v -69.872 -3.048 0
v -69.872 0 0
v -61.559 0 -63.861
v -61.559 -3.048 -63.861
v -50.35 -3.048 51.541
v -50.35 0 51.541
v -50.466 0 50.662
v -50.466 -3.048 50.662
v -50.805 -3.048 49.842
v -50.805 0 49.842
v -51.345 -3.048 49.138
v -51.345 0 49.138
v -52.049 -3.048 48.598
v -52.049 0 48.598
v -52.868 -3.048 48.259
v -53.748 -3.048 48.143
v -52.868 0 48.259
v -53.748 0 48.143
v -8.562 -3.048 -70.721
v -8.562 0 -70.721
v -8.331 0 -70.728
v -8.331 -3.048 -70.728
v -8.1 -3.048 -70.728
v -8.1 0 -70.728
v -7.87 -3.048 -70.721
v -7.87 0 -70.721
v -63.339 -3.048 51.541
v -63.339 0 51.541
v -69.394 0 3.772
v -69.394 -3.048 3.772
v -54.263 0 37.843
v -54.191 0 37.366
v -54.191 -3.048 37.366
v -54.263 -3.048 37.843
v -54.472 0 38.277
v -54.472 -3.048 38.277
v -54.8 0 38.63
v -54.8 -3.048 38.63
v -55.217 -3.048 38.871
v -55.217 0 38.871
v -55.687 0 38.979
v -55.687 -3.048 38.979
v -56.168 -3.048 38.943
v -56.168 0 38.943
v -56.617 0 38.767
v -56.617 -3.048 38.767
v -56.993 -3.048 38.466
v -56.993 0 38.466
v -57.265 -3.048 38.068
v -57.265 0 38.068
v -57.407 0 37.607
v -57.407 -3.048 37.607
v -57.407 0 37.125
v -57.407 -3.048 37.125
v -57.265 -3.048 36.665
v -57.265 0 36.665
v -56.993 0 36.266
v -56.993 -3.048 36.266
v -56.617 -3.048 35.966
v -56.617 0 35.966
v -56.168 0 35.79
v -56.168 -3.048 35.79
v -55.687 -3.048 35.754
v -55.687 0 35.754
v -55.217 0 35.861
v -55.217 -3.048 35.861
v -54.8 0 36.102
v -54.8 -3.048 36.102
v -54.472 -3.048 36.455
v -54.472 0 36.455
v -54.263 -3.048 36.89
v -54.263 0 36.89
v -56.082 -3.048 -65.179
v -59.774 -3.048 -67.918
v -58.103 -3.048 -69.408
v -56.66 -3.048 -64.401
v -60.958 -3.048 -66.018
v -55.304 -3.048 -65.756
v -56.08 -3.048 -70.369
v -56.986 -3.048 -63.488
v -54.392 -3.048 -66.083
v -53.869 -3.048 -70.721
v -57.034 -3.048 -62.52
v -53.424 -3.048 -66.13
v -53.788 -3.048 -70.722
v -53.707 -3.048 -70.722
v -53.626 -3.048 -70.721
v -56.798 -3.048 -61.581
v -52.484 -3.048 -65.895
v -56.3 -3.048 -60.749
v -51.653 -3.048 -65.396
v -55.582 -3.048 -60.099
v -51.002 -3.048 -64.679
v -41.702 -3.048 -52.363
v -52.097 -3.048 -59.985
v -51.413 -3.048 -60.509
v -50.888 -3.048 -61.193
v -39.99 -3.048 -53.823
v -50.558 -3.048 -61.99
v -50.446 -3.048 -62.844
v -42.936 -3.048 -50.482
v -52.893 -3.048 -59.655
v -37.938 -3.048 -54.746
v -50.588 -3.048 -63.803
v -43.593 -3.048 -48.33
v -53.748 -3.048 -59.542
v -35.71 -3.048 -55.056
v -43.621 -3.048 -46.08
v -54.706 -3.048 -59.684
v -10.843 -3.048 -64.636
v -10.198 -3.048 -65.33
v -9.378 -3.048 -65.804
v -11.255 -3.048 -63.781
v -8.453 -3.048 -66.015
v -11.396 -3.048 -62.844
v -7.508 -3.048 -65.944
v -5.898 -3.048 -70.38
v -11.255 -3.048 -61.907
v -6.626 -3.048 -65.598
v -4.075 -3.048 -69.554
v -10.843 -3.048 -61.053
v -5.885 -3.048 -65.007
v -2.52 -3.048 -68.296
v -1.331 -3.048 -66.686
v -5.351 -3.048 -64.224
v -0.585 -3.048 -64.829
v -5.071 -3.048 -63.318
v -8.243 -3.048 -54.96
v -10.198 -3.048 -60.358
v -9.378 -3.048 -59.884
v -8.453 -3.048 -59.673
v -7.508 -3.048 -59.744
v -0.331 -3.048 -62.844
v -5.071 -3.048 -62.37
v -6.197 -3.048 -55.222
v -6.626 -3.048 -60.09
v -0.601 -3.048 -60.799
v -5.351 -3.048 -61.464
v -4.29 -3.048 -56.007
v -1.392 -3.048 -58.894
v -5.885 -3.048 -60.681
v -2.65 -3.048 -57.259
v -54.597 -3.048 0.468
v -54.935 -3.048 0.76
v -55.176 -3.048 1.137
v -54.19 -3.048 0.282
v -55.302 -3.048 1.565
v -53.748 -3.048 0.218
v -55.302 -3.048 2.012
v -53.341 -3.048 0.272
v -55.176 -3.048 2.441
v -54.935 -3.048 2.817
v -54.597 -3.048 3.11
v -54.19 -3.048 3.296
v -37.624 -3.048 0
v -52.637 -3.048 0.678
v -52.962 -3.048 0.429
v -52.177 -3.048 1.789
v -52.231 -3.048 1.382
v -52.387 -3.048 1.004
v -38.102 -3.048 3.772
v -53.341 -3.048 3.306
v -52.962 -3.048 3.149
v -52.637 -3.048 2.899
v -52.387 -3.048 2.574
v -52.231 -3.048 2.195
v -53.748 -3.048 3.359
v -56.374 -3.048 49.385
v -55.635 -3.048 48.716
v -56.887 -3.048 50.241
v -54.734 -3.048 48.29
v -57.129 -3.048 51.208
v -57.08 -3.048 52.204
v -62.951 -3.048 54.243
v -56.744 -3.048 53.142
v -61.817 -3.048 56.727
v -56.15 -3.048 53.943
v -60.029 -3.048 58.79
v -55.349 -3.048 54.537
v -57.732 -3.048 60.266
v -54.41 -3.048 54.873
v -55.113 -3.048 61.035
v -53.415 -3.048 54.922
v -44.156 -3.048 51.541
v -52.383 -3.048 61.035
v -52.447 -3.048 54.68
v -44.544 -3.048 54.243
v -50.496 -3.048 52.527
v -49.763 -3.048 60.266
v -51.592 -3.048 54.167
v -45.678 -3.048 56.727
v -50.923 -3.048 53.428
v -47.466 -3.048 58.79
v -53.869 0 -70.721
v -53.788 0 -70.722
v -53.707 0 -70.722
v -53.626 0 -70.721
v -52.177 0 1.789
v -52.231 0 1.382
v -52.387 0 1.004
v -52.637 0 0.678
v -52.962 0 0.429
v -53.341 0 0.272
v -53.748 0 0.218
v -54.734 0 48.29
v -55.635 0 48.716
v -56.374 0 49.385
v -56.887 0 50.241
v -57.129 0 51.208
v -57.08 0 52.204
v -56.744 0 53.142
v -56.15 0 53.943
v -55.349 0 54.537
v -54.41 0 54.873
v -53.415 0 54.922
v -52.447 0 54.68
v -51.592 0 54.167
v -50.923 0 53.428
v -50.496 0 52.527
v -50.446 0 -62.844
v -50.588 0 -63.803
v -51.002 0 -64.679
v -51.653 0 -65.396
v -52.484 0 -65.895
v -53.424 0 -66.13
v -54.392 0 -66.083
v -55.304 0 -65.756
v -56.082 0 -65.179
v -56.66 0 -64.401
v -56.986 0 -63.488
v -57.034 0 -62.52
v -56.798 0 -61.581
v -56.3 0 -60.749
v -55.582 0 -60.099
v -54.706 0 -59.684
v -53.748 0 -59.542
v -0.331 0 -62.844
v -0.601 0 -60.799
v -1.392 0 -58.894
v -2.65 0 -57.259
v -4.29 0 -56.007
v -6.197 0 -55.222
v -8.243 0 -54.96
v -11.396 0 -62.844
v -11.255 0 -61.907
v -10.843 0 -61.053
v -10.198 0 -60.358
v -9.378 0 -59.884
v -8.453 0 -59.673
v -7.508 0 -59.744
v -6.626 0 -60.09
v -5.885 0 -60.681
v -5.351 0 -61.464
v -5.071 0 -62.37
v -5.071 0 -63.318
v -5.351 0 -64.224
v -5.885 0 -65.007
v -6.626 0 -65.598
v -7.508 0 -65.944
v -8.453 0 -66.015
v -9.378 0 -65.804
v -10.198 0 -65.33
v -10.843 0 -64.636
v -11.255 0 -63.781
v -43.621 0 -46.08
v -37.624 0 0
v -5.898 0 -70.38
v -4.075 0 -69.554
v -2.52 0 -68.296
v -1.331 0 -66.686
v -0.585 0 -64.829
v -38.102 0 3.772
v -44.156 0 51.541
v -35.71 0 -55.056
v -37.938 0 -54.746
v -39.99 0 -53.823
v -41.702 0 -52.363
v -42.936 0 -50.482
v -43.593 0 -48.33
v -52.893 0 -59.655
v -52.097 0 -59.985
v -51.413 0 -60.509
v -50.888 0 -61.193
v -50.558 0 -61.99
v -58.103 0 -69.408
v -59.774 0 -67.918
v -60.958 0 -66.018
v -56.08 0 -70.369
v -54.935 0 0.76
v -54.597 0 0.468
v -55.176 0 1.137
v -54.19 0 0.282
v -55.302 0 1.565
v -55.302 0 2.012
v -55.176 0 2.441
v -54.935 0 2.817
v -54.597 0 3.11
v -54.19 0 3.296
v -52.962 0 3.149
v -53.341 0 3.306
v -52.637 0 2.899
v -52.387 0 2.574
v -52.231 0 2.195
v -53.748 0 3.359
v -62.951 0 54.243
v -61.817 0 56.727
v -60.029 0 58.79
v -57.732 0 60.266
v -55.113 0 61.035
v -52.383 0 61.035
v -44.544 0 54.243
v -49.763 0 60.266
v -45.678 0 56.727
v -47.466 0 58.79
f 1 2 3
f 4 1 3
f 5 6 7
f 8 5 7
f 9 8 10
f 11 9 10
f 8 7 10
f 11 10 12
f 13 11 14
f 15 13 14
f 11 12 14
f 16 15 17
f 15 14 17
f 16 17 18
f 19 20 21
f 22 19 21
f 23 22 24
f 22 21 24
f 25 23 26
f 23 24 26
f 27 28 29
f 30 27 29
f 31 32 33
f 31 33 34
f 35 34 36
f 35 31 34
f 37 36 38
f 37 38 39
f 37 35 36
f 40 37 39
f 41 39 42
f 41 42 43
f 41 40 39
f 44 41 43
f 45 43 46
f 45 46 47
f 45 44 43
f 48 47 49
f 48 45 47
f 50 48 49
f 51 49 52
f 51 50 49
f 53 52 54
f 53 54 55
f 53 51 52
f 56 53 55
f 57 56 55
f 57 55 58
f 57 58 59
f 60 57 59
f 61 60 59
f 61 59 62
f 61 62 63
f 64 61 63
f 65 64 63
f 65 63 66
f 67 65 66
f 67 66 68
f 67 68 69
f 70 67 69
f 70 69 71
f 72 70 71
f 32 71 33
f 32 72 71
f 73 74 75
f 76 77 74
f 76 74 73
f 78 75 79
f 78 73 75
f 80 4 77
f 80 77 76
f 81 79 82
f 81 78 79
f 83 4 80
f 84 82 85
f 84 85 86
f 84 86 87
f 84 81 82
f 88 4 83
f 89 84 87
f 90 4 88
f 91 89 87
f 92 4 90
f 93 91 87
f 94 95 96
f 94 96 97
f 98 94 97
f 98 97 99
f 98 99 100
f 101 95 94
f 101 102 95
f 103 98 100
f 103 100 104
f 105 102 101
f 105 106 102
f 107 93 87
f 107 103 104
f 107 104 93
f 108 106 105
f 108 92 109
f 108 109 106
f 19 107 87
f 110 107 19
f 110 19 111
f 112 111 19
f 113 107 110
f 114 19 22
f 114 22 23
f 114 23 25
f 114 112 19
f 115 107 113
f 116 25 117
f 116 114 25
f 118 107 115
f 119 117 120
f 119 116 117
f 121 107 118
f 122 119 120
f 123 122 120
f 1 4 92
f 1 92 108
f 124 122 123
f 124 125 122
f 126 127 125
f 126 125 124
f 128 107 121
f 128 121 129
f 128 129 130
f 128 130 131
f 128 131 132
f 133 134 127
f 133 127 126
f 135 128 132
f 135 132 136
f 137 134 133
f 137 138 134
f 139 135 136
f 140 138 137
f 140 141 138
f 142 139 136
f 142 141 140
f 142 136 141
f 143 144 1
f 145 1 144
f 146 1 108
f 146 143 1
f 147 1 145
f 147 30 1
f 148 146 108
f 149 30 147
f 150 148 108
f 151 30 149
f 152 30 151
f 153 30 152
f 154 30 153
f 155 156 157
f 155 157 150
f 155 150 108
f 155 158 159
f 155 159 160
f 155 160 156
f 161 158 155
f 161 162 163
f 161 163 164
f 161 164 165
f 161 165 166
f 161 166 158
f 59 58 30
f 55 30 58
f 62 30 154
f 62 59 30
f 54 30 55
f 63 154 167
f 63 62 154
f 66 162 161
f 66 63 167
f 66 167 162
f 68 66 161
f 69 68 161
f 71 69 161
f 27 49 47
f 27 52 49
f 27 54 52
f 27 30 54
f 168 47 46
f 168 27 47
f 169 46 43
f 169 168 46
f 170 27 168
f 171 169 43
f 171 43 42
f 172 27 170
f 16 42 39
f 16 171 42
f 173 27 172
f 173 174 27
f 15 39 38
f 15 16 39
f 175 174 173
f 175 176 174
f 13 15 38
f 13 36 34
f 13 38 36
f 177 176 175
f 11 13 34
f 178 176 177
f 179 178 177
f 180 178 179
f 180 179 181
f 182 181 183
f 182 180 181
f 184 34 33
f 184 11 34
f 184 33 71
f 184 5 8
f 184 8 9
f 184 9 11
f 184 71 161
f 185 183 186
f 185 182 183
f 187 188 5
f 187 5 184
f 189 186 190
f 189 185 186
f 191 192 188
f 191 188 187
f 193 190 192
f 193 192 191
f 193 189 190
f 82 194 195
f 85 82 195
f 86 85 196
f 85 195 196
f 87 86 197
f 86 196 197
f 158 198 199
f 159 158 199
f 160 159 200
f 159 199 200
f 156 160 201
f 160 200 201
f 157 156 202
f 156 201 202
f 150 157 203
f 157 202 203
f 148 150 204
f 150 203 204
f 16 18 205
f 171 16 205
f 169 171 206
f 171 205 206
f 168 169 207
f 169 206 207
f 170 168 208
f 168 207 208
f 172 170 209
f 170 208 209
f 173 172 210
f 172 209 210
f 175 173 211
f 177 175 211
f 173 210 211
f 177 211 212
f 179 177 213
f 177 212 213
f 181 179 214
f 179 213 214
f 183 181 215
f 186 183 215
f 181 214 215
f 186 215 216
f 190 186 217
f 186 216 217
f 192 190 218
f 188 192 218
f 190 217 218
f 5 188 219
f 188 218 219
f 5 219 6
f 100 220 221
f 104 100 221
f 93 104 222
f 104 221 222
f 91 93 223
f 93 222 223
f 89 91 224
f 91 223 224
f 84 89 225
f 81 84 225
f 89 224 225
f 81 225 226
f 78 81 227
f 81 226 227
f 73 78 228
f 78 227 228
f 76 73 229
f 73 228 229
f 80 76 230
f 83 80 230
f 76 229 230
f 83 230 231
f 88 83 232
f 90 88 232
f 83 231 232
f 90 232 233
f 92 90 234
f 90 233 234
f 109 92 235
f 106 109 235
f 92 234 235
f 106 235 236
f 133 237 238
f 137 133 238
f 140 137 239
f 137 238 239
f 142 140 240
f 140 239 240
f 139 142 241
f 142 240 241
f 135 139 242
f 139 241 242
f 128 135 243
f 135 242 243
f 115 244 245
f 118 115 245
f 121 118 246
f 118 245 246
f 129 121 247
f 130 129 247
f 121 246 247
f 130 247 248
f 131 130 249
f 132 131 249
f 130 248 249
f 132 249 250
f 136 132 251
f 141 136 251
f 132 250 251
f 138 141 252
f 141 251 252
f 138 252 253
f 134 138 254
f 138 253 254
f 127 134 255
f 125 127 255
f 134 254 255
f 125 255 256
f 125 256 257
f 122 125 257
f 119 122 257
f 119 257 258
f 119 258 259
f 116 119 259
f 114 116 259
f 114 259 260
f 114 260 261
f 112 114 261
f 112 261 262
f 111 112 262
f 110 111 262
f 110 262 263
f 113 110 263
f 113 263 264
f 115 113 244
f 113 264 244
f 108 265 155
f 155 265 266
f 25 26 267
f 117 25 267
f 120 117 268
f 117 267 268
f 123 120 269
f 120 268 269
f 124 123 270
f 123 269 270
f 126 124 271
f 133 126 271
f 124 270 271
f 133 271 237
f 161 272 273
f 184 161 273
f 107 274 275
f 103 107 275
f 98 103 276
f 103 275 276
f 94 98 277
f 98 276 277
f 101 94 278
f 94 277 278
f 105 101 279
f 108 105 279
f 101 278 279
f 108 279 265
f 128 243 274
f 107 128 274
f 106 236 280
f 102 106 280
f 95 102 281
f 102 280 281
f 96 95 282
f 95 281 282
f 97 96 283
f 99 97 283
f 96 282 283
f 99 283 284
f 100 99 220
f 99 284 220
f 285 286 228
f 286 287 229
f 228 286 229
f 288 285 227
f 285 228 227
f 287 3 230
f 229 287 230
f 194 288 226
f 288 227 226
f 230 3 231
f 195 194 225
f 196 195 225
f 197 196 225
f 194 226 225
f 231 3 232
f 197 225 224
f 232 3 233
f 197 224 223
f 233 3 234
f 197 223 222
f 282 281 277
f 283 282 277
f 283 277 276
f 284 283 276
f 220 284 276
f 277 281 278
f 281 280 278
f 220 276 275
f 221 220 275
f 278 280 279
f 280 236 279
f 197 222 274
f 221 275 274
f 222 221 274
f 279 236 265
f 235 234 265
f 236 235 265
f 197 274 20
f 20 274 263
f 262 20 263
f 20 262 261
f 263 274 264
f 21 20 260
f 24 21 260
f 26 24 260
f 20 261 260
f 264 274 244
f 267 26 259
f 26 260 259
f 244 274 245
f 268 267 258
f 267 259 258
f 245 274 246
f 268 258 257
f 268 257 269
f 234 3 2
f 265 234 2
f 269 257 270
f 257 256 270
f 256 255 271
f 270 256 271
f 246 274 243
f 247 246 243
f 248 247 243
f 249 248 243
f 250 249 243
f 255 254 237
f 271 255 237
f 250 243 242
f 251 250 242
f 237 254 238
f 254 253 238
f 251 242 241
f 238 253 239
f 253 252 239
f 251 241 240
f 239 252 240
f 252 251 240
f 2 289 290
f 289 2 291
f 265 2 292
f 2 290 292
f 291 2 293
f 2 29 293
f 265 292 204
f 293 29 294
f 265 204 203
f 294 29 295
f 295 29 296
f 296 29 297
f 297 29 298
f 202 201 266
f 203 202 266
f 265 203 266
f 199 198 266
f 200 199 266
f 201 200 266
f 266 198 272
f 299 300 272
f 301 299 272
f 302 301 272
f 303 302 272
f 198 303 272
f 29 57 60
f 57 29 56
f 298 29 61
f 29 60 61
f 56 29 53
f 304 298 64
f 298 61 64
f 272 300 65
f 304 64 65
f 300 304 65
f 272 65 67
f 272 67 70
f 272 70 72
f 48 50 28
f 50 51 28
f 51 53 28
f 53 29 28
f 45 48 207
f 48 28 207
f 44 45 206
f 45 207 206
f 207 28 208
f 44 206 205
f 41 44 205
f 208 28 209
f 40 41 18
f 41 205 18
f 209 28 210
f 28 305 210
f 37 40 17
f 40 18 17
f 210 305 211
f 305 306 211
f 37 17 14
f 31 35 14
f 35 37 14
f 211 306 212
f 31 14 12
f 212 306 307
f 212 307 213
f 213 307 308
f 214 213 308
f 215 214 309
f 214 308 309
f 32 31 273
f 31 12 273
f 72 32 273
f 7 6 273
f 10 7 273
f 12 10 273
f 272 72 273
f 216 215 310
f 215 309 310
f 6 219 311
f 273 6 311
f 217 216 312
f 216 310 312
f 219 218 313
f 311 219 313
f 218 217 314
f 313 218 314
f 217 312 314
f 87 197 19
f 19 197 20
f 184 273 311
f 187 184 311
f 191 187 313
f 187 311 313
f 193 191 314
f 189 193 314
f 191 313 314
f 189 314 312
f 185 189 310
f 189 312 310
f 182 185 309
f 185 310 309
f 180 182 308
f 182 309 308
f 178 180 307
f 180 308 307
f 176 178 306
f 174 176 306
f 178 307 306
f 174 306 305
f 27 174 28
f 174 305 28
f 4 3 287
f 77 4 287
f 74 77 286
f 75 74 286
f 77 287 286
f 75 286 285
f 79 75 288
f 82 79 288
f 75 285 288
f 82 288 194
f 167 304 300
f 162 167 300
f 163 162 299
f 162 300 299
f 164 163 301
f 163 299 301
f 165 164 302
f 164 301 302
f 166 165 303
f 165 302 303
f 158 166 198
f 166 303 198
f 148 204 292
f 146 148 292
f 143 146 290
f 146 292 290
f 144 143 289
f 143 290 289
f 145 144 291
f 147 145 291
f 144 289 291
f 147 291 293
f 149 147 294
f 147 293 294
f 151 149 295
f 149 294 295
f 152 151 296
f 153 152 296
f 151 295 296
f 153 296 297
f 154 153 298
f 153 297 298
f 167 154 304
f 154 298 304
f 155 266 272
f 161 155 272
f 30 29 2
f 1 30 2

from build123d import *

# Parameters (mm, degrees)
F0_R     = 1.6169626647
F1_DEPTH = 3.048


with BuildPart() as f1:
    # F0 (on Front) → F1 (new body)
    with BuildSketch(Plane.XZ):
        with BuildLine():
            ThreePointArc((-63.3394401935, 51.5408627689), (-60.5300601386, 44.7584193386), (-53.7476167083, 41.9490392837))
            ThreePointArc((-53.7476167083, 41.9490392837), (-46.9651732779, 44.7584193386), (-44.1557932231, 51.5408627689))
            ThreePointArc((-44.1557932231, 51.5408627689), (-53.7476167083, 61.1326862541), (-63.3394401935, 51.5408627689))
        make_face()
        with BuildLine():
            ThreePointArc((-50.3500356436, 51.5408627689), (-51.3451640978, 49.1384101584), (-53.7476167083, 48.1432817042))
            ThreePointArc((-53.7476167083, 48.1432817042), (-56.1500693187, 53.9433153794), (-50.3500356436, 51.5408627689))
        make_face(mode=Mode.SUBTRACT)
        with BuildLine():
            ThreePointArc((-44.1557932231, 51.5408627689), (-46.9651732779, 44.7584193386), (-53.7476167083, 41.9490392837))
            Line((-53.7476167083, 41.9490392837), (-53.7476167083, 17.560091))
            ThreePointArc((-53.7476167083, 17.560091), (-43.320354495, 13.6211561996), (-38.1016313362, 3.7718956578))
            Line((-38.1016313362, 3.7718956578), (-44.1557932231, 51.5408627689))
        make_face()
        with BuildLine():
            Line((-53.7476167083, 17.560091), (-53.7476167083, 41.9490392837))
            ThreePointArc((-53.7476167083, 41.9490392837), (-60.5300601386, 44.7584193386), (-63.3394401935, 51.5408627689))
            Line((-63.3394401935, 51.5408627689), (-69.3936021245, 3.7718953097))
            ThreePointArc((-69.3936021245, 3.7718953097), (-64.1748790532, 13.6211560835), (-53.7476167083, 17.560091))
        make_face()
        with Locations((-55.8080822229, 37.366181612)):
            Circle(F0_R, mode=Mode.SUBTRACT)
        with BuildLine():
            ThreePointArc((-38.1016313362, 3.7718956578), (-43.320354495, 13.6211561996), (-53.7476167083, 17.560091))
            Line((-53.7476167083, 17.560091), (-53.7476167083, 3.3594787524))
            ThreePointArc((-53.7476167083, 3.3594787524), (-52.6370840671, 2.8994810709), (-52.1770863857, 1.7889484297))
            ThreePointArc((-52.1770863857, 1.7889484297), (-52.6370840671, 0.6784157886), (-53.7476167083, 0.2184181071))
            Line((-53.7476167083, 0.2184181071), (-53.7476167083, -13.9821941405))
            ThreePointArc((-53.7476167083, -13.9821941405), (-42.5957348498, -9.3629334288), (-37.976474138, 1.7889484297))
            ThreePointArc((-37.976474138, 1.7889484297), (-38.0077945376, 2.78239496), (-38.1016313362, 3.7718956578))
        make_face()
        with BuildLine():
            Line((-53.7476167083, 3.3594787524), (-53.7476167083, 17.560091))
            ThreePointArc((-53.7476167083, 17.560091), (-64.1748790532, 13.6211560835), (-69.3936021245, 3.7718953097))
            ThreePointArc((-69.3936021245, 3.7718953097), (-65.5798243621, -8.6383139152), (-53.7476167083, -13.9821941405))
            Line((-53.7476167083, -13.9821941405), (-53.7476167083, 0.2184181071))
            ThreePointArc((-53.7476167083, 0.2184181071), (-55.3181470309, 1.7889484297), (-53.7476167083, 3.3594787524))
        make_face()
        with BuildLine():
            Line((-37.6235873609, 0), (-38.1016313362, 3.7718956578))
            ThreePointArc((-38.1016313362, 3.7718956578), (-38.0077945376, 2.78239496), (-37.976474138, 1.7889484297))
            ThreePointArc((-37.976474138, 1.7889484297), (-42.5957348498, -9.3629334288), (-53.7476167083, -13.9821941405))
            Line((-53.7476167083, -13.9821941405), (-53.7476167083, -54.9663756517))
            ThreePointArc((-53.7476167083, -54.9663756517), (-48.1772102832, -57.2737135409), (-45.869872394, -62.844119966))
            Line((-45.869872394, -62.844119966), (-16.1001367542, -62.844119966))
            ThreePointArc((-16.1001367542, -62.844119966), (-13.8006404187, -57.278812686), (-8.2434529492, -54.9597620295))
            Line((-8.2434529492, -54.9597620295), (-35.7097443, -55.0563386246))
            ThreePointArc((-35.7097443, -55.0563386246), (-41.7018969318, -52.3629945232), (-43.6213969554, -46.0800401807))
            Line((-43.6213969554, -46.0800401807), (-37.6235873609, 0))
        make_face()
        with BuildLine():
            ThreePointArc((-53.7476167083, -13.9821941405), (-65.5798243621, -8.6383139152), (-69.3936021245, 3.7718953097))
            Line((-69.3936021245, 3.7718953097), (-69.8716460556, 0))
            Line((-69.8716460556, 0), (-61.5594655419, -63.8609155613))
            ThreePointArc((-61.5594655419, -63.8609155613), (-59.6666078048, -57.6456201939), (-53.7476167083, -54.9663756517))
            Line((-53.7476167083, -54.9663756517), (-53.7476167083, -13.9821941405))
        make_face()
        with BuildLine():
            Line((-53.7476167083, -59.5422655519), (-53.7476167083, -54.9663756517))
            ThreePointArc((-53.7476167083, -54.9663756517), (-59.6666078048, -57.6456201939), (-61.5594655419, -63.8609155613))
            ThreePointArc((-61.5594655419, -63.8609155613), (-58.991522279, -68.7229217017), (-53.868886638, -70.7209308109))
            Line((-53.868886638, -70.7209308109), (-53.6263467786, -70.7209308109))
            ThreePointArc((-53.6263467786, -70.7209308109), (-48.1344986363, -68.371484708), (-45.869872394, -62.844119966))
            Line((-45.869872394, -62.844119966), (-50.4457622942, -62.844119966))
            ThreePointArc((-50.4457622942, -62.844119966), (-56.082380355, -65.1788836127), (-53.7476167083, -59.5422655519))
        make_face()
        with BuildLine():
            Line((-16.1001367542, -62.844119966), (-45.869872394, -62.844119966))
            ThreePointArc((-45.869872394, -62.844119966), (-48.1344986363, -68.371484708), (-53.6263467786, -70.7209308109))
            Line((-53.6263467786, -70.7209308109), (-8.5617351981, -70.7209308109))
            ThreePointArc((-8.5617351981, -70.7209308109), (-13.9118653342, -68.2955337071), (-16.1001367542, -62.844119966))
        make_face()
        with BuildLine():
            Line((-53.6263467786, -70.7209308109), (-53.868886638, -70.7209308109))
            ThreePointArc((-53.868886638, -70.7209308109), (-53.7476167083, -70.7218642803), (-53.6263467786, -70.7209308109))
        make_face()
        with BuildLine():
            ThreePointArc((-0.3313234028, -62.844119966), (-2.6504227985, -57.2592096259), (-8.2434529492, -54.9597620295))
            ThreePointArc((-8.2434529492, -54.9597620295), (-13.8006404187, -57.278812686), (-16.1001367542, -62.844119966))
            ThreePointArc((-16.1001367542, -62.844119966), (-13.9118653342, -68.2955337071), (-8.5617351981, -70.7209308109))
            Line((-8.5617351981, -70.7209308109), (-7.8697249589, -70.7209308109))
            ThreePointArc((-7.8697249589, -70.7209308109), (-2.5195948228, -68.2955337071), (-0.3313234028, -62.844119966))
        make_face()
        with BuildLine():
            ThreePointArc((-5.0356472554, -62.844119966), (-8.2157300785, -66.0242027891), (-11.3958129016, -62.844119966))
            ThreePointArc((-11.3958129016, -62.844119966), (-8.2157300785, -59.6640371429), (-5.0356472554, -62.844119966))
        make_face(mode=Mode.SUBTRACT)
        with BuildLine():
            Line((-7.8697249589, -70.7209308109), (-8.5617351981, -70.7209308109))
            ThreePointArc((-8.5617351981, -70.7209308109), (-8.2157300785, -70.7285266418), (-7.8697249589, -70.7209308109))
        make_face()
        with BuildLine():
            ThreePointArc((-45.869872394, -62.844119966), (-48.1772102832, -57.2737135409), (-53.7476167083, -54.9663756517))
            Line((-53.7476167083, -54.9663756517), (-53.7476167083, -59.5422655519))
            ThreePointArc((-53.7476167083, -59.5422655519), (-51.4128530616, -60.5093563193), (-50.4457622942, -62.844119966))
            Line((-50.4457622942, -62.844119966), (-45.869872394, -62.844119966))
        make_face()
    extrude(amount=F1_DEPTH)


solid = f1.part
